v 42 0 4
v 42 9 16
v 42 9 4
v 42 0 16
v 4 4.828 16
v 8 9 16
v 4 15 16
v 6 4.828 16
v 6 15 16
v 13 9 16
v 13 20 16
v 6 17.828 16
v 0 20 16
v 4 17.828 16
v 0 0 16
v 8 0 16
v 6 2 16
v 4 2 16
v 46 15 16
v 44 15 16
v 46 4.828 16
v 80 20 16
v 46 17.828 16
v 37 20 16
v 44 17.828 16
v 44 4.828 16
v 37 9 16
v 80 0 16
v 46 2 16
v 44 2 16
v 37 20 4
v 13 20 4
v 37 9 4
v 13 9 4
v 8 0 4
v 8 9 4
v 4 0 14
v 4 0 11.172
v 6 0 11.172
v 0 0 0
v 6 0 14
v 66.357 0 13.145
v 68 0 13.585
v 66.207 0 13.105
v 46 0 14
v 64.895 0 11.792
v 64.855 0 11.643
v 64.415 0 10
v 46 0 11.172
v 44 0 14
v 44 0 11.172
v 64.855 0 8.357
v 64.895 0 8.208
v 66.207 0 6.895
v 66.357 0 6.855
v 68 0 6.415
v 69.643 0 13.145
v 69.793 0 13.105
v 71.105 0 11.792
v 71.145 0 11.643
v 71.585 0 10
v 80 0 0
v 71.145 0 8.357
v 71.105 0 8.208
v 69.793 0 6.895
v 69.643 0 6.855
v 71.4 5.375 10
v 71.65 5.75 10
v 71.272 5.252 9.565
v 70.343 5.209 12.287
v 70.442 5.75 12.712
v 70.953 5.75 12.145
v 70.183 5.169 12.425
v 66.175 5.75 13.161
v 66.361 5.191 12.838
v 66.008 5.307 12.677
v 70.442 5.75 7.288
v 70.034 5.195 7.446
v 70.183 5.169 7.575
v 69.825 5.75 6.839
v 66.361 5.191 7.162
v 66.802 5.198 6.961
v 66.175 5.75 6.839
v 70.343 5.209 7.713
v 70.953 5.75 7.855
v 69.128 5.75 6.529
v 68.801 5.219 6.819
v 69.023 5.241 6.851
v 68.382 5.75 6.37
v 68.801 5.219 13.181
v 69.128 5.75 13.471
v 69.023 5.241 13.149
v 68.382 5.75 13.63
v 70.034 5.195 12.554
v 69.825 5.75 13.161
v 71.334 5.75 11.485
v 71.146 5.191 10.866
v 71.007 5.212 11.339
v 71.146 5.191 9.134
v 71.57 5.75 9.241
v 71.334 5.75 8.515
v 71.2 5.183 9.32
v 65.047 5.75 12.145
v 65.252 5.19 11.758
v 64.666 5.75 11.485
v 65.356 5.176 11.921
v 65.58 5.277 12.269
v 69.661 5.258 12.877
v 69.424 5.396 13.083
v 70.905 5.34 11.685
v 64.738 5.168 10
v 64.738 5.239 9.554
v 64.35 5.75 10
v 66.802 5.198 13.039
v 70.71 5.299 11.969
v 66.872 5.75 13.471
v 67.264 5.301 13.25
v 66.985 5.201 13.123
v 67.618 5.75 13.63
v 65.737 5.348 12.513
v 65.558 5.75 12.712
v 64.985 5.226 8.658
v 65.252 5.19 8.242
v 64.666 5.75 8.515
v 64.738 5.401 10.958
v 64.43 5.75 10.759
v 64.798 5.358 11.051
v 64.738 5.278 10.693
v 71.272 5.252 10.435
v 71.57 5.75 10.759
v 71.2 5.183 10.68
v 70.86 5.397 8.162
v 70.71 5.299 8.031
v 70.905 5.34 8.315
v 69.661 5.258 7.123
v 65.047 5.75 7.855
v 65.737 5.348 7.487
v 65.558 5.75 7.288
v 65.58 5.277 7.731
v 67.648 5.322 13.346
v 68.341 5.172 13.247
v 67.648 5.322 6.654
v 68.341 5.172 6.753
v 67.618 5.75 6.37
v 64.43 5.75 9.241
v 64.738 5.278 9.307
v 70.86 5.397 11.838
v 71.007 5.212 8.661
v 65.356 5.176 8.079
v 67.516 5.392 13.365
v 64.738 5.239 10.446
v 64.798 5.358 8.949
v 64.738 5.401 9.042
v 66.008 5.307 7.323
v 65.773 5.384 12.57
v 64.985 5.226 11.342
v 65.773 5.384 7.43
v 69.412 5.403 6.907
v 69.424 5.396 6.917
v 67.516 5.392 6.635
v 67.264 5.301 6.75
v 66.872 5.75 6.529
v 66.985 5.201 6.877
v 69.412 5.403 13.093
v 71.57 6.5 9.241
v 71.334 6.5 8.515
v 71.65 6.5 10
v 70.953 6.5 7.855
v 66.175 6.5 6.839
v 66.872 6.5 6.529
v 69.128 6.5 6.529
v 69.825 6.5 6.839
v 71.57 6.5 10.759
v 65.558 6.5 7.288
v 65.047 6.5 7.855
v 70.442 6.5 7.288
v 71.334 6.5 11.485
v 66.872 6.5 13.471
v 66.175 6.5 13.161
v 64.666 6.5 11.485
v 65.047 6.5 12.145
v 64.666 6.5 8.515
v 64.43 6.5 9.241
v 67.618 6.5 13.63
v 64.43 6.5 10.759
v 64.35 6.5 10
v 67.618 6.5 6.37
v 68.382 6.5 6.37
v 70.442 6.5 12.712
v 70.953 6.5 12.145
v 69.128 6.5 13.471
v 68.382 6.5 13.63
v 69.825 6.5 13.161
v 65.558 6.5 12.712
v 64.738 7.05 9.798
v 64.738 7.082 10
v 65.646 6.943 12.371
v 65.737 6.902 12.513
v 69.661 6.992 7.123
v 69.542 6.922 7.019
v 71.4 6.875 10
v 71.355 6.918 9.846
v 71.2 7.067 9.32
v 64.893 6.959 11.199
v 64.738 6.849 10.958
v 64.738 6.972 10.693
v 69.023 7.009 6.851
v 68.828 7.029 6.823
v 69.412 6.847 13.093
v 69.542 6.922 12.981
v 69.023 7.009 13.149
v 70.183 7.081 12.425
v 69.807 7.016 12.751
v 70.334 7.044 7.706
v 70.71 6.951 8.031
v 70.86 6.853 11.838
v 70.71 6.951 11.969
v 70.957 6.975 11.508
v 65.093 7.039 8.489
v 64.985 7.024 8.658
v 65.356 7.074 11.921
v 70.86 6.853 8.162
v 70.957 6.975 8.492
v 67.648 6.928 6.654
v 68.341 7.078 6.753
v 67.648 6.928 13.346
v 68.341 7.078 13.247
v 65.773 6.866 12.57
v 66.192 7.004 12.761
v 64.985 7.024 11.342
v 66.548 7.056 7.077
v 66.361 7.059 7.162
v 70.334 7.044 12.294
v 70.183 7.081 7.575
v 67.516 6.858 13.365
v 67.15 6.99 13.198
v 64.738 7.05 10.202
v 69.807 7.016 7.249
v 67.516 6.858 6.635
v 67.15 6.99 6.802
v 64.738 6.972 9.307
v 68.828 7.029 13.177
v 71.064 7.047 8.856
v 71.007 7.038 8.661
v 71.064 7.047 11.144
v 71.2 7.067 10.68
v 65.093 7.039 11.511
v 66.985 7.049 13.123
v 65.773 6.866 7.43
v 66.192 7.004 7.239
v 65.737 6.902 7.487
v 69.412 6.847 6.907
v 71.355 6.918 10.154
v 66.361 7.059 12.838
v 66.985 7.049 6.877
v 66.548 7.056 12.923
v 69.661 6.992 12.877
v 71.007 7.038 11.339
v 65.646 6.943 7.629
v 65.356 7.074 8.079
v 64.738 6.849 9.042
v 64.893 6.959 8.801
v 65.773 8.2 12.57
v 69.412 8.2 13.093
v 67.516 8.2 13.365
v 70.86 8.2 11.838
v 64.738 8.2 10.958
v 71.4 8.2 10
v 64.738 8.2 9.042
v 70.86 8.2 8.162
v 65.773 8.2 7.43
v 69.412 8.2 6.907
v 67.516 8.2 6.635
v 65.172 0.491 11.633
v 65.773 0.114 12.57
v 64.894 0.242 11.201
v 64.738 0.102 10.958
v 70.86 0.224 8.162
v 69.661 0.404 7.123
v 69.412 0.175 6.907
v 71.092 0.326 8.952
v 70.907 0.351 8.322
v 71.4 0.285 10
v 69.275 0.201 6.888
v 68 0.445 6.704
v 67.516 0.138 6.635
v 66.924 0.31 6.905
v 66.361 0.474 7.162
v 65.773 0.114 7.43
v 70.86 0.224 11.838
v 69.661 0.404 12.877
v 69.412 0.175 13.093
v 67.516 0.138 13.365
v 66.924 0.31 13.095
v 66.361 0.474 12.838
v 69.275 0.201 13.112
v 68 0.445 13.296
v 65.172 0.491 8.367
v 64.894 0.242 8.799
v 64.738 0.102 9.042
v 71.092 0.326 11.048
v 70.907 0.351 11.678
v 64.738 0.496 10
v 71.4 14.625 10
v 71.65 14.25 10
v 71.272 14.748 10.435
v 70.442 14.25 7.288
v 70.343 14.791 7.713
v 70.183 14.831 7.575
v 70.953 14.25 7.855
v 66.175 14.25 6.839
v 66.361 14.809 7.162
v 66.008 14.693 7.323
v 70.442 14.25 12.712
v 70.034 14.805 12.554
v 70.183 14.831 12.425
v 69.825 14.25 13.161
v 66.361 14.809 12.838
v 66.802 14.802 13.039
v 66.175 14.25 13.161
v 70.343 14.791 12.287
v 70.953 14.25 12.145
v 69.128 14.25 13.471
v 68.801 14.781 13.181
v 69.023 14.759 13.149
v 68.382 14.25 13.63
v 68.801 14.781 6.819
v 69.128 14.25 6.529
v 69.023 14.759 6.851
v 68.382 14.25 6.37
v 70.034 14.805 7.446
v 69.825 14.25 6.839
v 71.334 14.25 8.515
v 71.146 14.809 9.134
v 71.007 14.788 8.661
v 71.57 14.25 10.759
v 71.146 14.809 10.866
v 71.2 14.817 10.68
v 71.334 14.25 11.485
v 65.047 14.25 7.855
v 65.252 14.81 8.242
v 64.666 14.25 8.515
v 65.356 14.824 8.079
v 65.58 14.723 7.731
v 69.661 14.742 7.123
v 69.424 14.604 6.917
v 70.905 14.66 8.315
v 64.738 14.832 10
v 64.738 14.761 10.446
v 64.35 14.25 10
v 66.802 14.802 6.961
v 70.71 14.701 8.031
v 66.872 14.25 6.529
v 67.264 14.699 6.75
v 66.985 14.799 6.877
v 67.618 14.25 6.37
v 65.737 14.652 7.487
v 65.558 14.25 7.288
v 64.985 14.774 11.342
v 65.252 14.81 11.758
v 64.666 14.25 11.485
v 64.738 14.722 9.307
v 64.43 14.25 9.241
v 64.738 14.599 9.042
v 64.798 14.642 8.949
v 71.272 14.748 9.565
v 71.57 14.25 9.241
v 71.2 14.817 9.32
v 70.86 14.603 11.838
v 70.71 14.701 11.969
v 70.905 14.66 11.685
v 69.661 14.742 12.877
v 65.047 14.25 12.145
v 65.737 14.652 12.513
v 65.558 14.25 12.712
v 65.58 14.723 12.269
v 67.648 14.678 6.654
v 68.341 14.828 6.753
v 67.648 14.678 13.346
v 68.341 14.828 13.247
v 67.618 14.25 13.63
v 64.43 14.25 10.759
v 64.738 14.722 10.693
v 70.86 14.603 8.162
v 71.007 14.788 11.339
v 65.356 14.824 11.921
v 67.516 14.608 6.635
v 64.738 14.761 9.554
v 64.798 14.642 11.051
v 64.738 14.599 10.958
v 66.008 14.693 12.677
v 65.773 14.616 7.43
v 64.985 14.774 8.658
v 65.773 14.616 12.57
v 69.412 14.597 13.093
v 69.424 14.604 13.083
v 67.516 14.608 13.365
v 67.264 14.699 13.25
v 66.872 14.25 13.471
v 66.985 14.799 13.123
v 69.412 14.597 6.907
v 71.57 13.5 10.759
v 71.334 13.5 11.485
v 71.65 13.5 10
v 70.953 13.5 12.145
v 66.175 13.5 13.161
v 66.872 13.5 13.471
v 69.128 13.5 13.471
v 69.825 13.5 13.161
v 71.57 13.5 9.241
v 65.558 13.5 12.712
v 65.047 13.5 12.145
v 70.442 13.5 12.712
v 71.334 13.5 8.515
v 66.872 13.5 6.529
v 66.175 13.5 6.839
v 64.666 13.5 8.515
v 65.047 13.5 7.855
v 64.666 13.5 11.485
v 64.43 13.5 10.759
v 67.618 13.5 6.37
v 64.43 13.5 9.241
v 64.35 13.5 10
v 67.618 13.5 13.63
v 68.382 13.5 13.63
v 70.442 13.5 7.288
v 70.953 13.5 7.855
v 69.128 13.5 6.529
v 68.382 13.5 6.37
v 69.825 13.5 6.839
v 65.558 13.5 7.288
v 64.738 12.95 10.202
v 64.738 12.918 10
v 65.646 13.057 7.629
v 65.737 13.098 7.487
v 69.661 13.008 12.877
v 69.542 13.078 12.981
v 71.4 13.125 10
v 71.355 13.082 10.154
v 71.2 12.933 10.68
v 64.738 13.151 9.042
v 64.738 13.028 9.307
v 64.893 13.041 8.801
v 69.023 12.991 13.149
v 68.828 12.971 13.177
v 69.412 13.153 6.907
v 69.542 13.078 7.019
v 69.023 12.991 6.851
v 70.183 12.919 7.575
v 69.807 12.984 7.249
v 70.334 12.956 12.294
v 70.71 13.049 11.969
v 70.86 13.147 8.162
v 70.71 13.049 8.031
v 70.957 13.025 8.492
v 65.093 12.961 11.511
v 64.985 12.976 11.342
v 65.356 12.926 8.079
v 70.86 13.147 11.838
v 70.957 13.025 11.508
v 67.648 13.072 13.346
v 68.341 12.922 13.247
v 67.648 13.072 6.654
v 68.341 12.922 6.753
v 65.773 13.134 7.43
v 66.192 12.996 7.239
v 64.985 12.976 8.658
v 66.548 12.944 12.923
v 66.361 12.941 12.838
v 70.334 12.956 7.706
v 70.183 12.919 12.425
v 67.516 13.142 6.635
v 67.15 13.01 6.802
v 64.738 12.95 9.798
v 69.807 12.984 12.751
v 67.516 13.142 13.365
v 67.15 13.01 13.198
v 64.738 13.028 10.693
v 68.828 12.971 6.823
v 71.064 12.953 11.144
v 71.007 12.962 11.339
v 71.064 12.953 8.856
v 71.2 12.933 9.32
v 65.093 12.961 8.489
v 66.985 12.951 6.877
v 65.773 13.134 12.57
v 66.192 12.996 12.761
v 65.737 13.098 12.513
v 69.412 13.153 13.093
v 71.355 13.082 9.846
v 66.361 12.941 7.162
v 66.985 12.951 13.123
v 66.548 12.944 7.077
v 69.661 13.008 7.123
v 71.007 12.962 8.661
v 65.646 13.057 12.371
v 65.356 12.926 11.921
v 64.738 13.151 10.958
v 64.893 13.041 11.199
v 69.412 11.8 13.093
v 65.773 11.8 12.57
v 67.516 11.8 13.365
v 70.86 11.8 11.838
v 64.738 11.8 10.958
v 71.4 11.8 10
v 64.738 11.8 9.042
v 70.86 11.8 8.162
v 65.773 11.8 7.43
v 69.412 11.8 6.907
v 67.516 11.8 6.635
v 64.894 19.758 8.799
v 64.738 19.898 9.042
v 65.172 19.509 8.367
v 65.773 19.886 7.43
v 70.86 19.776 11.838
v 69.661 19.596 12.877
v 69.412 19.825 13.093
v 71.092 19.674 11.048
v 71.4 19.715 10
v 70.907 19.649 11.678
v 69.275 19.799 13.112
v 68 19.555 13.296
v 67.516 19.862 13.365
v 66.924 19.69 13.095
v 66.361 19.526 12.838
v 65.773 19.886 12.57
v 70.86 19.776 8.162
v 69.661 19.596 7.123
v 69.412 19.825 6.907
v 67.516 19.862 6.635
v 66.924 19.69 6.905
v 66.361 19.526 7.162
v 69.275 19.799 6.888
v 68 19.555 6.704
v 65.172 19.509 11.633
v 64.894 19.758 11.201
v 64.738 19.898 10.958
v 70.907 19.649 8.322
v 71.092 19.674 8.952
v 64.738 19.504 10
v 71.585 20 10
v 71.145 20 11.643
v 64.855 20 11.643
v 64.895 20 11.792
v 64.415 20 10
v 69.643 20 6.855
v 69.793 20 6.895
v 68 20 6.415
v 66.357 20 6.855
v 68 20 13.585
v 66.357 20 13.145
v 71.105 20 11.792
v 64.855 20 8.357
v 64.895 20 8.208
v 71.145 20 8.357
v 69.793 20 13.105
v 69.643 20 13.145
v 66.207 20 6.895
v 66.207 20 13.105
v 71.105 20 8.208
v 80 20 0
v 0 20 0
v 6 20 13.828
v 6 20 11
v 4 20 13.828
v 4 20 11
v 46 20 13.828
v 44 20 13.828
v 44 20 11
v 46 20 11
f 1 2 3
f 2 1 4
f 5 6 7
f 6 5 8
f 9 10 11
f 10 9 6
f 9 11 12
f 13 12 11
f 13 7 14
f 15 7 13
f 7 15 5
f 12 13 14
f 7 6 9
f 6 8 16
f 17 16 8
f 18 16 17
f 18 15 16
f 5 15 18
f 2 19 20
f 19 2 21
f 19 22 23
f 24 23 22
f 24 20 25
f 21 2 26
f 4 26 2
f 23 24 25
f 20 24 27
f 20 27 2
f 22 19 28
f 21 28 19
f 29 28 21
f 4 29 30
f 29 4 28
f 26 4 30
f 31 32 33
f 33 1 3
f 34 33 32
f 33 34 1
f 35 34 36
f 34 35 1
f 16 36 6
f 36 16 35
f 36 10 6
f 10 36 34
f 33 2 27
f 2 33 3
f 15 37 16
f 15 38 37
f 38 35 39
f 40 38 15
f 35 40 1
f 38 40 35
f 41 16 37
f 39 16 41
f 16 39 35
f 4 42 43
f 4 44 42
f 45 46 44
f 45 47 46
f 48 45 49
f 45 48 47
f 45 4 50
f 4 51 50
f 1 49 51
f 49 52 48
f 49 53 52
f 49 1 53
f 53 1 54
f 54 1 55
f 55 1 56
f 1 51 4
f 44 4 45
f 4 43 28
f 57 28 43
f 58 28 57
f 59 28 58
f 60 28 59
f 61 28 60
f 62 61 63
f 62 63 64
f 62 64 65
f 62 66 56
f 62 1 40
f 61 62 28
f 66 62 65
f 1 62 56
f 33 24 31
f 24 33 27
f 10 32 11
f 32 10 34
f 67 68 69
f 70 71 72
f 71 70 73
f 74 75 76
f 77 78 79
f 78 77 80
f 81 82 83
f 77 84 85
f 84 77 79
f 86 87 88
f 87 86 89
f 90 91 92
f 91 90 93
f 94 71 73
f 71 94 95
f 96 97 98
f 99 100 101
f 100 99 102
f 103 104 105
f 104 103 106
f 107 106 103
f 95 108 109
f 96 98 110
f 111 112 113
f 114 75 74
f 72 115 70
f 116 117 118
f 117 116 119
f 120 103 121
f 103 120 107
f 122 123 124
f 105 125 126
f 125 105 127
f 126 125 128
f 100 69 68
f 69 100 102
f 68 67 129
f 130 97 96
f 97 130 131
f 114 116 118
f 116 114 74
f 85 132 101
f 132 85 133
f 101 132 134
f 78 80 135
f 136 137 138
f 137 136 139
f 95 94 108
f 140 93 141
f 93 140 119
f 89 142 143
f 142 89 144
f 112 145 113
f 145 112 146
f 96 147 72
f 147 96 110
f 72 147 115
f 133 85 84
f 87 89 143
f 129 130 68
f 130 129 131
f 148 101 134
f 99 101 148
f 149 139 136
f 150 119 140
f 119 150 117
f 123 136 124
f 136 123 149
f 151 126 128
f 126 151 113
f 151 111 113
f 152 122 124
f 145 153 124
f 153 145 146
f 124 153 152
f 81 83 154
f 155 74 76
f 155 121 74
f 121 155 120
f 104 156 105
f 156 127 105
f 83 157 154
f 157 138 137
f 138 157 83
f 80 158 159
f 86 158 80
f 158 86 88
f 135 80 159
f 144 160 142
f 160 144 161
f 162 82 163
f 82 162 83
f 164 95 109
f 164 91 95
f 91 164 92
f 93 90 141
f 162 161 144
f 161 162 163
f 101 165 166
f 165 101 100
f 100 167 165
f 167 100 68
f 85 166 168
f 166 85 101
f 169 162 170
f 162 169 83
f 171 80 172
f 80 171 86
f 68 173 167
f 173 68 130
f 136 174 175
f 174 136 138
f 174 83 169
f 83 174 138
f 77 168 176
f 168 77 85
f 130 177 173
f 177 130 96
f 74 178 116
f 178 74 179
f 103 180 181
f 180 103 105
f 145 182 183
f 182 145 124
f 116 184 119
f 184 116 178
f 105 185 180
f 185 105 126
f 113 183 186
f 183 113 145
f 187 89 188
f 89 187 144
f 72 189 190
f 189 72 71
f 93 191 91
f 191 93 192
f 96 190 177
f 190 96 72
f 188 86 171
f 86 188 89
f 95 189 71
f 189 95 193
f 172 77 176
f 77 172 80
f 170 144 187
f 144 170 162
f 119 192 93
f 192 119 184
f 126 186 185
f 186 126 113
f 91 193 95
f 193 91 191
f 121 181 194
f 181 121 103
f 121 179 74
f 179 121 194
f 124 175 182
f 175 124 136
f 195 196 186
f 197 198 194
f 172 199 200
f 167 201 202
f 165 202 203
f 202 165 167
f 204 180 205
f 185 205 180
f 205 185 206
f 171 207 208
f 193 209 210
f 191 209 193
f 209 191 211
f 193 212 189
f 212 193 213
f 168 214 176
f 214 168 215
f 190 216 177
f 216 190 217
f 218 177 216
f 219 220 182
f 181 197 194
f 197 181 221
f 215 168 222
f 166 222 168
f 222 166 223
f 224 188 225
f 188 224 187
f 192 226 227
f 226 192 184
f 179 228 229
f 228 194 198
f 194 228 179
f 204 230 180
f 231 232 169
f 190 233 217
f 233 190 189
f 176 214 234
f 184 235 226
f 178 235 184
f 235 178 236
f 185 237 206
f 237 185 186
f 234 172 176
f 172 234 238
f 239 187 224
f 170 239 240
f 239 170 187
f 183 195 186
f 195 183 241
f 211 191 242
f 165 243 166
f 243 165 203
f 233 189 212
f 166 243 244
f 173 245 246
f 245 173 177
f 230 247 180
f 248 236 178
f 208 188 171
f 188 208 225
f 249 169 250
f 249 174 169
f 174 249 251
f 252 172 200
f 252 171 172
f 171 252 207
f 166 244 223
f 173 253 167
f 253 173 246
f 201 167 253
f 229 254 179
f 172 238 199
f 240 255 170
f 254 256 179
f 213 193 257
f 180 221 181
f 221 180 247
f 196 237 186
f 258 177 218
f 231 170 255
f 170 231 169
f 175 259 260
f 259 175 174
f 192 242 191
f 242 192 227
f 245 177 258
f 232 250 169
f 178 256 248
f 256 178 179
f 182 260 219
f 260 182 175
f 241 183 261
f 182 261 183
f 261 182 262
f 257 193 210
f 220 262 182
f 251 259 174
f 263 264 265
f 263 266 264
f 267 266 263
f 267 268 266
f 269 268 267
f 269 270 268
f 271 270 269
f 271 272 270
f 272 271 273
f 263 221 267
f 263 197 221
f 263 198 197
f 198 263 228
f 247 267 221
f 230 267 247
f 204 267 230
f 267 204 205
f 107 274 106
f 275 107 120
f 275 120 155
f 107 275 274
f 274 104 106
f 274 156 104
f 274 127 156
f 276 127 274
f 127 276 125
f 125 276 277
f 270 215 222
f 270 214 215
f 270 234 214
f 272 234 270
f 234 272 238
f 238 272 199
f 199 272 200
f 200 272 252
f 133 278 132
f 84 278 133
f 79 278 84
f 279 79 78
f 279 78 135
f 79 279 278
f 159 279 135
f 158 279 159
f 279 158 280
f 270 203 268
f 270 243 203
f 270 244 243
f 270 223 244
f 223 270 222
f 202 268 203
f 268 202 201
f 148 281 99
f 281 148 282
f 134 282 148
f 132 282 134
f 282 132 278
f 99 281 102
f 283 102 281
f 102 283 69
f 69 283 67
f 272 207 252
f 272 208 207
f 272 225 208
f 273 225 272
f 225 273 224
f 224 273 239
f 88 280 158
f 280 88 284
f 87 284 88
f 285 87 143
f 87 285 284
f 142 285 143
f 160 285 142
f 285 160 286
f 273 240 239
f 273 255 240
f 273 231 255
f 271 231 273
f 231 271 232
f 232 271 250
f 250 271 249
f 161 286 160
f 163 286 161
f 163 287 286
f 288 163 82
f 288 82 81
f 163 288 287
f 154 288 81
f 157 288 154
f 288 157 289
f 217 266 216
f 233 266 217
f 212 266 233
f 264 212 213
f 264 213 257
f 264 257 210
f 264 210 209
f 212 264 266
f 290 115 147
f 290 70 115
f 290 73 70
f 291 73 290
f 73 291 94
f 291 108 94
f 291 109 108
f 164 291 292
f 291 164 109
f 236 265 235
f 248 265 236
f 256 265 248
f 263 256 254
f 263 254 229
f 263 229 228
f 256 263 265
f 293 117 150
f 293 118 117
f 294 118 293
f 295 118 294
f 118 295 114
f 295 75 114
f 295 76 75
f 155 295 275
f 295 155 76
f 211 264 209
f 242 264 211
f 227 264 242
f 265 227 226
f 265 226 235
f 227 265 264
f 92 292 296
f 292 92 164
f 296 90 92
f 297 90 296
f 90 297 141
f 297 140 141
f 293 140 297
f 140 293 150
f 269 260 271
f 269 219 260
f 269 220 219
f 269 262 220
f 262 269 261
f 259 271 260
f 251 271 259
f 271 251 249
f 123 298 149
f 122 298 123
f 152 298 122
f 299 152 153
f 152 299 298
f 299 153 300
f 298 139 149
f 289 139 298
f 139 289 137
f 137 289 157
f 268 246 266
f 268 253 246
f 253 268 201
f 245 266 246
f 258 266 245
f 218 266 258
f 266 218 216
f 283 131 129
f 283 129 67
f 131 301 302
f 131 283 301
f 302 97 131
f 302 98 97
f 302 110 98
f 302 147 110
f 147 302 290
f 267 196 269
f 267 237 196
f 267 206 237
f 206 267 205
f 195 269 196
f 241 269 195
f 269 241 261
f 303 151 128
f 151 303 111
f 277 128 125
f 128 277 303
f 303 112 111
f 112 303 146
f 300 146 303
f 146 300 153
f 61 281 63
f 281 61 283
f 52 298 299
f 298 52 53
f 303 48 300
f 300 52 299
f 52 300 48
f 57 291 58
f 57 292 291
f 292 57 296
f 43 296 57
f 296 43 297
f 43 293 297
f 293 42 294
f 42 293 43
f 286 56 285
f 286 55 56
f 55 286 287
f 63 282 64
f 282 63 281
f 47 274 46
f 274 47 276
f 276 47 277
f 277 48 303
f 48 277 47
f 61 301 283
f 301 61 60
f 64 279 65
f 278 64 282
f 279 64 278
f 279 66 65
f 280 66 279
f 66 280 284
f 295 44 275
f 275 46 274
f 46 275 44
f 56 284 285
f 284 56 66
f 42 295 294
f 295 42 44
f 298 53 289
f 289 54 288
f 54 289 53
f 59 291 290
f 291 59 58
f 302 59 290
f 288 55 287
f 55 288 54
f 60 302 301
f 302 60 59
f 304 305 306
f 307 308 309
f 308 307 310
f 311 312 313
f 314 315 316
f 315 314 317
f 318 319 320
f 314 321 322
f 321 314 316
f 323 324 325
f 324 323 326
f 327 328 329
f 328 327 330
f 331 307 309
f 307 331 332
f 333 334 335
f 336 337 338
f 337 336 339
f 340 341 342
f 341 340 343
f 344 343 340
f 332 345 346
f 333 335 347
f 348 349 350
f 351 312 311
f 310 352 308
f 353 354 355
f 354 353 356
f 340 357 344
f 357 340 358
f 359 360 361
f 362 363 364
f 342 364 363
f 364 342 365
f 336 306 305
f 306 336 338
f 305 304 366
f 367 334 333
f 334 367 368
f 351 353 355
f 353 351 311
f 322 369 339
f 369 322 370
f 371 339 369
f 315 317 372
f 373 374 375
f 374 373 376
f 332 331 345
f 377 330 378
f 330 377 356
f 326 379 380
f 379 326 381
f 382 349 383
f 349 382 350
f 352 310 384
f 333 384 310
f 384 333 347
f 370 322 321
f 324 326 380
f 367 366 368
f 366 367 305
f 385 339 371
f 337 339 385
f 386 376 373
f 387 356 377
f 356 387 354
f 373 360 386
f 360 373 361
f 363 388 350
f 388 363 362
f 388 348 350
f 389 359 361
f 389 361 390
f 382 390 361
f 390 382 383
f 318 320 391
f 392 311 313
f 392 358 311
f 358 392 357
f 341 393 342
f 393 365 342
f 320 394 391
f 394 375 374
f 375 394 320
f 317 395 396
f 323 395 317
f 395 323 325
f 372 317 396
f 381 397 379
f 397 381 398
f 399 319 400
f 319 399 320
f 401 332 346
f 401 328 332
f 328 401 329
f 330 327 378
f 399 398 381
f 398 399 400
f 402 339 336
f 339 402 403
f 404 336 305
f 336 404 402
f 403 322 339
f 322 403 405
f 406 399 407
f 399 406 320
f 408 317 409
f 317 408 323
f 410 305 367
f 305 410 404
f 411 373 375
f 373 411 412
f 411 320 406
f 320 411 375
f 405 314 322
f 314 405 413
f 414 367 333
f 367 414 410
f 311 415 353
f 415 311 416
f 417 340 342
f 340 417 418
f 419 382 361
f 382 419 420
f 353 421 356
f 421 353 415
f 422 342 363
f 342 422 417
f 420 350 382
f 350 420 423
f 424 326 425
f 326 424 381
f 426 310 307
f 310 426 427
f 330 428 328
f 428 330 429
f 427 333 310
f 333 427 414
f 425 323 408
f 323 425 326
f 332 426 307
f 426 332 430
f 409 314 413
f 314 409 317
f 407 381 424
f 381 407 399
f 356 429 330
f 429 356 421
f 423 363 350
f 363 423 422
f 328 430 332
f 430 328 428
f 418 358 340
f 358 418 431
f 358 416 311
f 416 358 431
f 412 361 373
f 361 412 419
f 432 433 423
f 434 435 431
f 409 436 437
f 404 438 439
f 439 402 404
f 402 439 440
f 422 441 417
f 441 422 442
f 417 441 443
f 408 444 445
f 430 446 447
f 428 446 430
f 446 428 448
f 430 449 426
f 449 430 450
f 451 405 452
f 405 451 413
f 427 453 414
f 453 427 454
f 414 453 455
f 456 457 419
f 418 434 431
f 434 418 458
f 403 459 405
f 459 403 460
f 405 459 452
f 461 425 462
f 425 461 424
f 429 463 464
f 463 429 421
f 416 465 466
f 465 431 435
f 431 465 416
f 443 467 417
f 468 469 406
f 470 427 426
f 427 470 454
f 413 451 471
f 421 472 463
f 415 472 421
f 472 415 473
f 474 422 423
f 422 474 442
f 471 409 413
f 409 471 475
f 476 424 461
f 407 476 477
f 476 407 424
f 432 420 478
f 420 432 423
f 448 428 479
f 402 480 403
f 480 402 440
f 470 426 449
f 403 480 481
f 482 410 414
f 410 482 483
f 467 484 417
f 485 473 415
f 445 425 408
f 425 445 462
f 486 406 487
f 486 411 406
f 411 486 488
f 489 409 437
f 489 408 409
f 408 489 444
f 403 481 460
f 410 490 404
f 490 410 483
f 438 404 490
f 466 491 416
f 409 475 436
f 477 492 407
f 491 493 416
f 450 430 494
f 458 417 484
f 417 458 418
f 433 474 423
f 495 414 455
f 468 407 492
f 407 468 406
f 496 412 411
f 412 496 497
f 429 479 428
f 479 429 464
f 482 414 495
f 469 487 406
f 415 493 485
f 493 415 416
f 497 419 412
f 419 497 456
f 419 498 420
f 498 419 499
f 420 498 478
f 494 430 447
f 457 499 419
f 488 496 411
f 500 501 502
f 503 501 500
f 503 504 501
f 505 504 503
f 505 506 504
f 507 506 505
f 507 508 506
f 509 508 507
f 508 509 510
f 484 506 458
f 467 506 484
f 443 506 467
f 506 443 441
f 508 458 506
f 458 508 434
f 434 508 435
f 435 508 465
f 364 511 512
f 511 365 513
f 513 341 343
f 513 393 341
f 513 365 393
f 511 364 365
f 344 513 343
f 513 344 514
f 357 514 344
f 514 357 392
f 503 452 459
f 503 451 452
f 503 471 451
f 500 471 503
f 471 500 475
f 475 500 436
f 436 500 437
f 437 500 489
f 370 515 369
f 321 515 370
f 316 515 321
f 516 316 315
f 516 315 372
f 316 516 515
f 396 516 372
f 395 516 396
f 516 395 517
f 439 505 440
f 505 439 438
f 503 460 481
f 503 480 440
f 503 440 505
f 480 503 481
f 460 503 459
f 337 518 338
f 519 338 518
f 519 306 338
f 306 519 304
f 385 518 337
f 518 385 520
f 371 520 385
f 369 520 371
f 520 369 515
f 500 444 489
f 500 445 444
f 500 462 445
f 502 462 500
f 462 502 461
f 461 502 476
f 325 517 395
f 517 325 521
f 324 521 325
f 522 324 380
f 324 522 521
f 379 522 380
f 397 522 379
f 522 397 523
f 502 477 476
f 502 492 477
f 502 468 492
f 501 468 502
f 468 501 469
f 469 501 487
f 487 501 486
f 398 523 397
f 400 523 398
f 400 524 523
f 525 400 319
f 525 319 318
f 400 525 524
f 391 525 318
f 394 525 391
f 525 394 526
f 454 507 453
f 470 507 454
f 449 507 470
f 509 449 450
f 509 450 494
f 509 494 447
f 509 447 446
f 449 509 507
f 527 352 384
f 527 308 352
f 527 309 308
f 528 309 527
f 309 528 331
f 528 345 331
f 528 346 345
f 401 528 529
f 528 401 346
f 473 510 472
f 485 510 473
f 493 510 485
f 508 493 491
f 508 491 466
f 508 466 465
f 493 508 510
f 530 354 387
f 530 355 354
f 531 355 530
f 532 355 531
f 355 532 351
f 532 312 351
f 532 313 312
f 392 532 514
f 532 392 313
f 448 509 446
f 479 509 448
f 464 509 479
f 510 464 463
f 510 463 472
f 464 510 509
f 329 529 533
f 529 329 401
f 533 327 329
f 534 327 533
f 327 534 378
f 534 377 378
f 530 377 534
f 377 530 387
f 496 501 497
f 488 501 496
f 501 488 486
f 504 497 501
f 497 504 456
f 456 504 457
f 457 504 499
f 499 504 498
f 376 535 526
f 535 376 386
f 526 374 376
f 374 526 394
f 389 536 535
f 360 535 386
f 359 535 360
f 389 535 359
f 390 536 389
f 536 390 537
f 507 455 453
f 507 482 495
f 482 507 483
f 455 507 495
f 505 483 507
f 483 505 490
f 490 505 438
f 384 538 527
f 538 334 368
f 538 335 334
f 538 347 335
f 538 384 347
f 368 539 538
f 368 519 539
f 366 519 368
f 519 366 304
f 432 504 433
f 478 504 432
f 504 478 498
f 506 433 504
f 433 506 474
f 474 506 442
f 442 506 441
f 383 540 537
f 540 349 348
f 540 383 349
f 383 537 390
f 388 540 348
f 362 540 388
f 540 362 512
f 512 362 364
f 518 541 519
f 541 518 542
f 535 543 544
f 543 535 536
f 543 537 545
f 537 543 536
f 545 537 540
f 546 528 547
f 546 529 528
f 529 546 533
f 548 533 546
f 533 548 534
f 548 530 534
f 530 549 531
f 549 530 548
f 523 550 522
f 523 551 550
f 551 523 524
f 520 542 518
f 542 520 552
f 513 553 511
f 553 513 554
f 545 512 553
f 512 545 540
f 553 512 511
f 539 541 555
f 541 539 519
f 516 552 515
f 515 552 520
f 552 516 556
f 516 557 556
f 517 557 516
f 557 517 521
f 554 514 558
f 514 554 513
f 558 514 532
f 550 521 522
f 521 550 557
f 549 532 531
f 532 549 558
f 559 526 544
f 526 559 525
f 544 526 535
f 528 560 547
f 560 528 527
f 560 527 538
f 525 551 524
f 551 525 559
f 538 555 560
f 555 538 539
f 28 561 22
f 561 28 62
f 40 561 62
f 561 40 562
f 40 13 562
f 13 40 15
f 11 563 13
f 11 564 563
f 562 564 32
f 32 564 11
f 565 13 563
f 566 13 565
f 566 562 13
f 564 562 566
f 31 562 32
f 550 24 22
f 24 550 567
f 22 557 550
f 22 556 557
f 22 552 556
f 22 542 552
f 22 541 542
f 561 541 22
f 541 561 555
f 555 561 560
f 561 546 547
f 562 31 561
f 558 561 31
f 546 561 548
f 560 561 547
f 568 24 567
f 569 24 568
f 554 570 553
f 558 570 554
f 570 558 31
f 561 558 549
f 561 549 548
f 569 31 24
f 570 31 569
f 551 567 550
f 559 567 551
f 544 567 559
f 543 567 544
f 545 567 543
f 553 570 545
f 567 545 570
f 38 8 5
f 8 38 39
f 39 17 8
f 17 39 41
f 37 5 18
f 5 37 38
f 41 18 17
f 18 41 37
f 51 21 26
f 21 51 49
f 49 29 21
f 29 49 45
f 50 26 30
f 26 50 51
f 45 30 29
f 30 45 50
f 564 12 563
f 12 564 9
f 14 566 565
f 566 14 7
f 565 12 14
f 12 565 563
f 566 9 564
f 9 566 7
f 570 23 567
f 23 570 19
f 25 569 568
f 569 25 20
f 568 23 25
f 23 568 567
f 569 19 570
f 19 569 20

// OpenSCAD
// Pin Connectors V2
// Tony Buser <tbuser@gmail.com>
// From http://www.thingiverse.com/thing:10541

// pinhole(h=5);

tolerance=0.3;

difference() {

// The base
cube([80, 20, 16]);

// Servo body
translate([8, 0, 4]) {
  // Servo front
  cube([34, 9, 12]);
  // Servo body
  translate([5, 0, 0]) cube([24, 24, 12]);
}

translate([68, 0, 10]) rotate([-90, 0, 0])
pinhole(r=3, h=8, t=tolerance, tight=false);

translate([68, 20, 10]) rotate([90, 0, 0])
pinhole(r=3, h=8, t=tolerance, tight=false);

// String holes
translate([4, 0, 16]) translate([0, -2, -4]) rotate([-45, 0, 0]) cube([2, 2, 20]);
translate([44, 0, 16]) translate([0, -2, -4]) rotate([-45, 0, 0]) cube([2, 2, 20]);
translate([4, 23, 8]) rotate([45, 0, 0]) cube([2, 2, 20]);
translate([44, 23, 8]) rotate([45, 0, 0]) cube([2, 2, 20]);


}

// test();
// pintack(h=10);
// pinpeg(h=20);

module test() {
  tolerance = 0.3;
  
  translate([-12, 12, 0]) pinpeg(h=20);
  translate([12, 12, 0]) pintack(h=10);
  
  difference() {
    union() {
      translate([0, -12, 2.5]) cube(size = [59, 20, 5], center = true);
      translate([24, -12, 7.5]) cube(size = [12, 20, 15], center = true);
    }
    translate([-24, -12, 0]) pinhole(h=5, t=tolerance);
    translate([-12, -12, 0]) pinhole(h=5, t=tolerance, tight=false);
    translate([0, -12, 0]) pinhole(h=10, t=tolerance);
    translate([12, -12, 0]) pinhole(h=10, t=tolerance, tight=false);
    translate([24, -12, 15]) rotate([0, 180, 0]) pinhole(h=10, t=tolerance);
  }
}

module pinhole(h=10, r=4, lh=3, lt=1, t=0.3, tight=true) {
  // h = shaft height
  // r = shaft radius
  // lh = lip height
  // lt = lip thickness
  // t = tolerance
  // tight = set to false if you want a joint that spins easily
  
  union() {
    pin_solid(h, r+(t/2), lh, lt);
    cylinder(h=h+0.2, r=r);
    // widen the cylinder slightly
    // cylinder(h=h+0.2, r=r+(t-0.2/2));
    if (tight == false) {
      cylinder(h=h+0.2, r=r+(t/2)+0.25);
    }
    // widen the entrance hole to make insertion easier
    translate([0, 0, -0.1]) cylinder(h=lh/3, r2=r, r1=r+(t/2)+(lt/2));
  }
}

module pin(h=10, r=4, lh=3, lt=1, side=false) {
  // h = shaft height
  // r = shaft radius
  // lh = lip height
  // lt = lip thickness
  // side = set to true if you want it printed horizontally

  if (side) {
    pin_horizontal(h, r, lh, lt);
  } else {
    pin_vertical(h, r, lh, lt);
  }
}

module pintack(h=10, r=4, lh=3, lt=1, bh=3, br=8.75) {
  // bh = base_height
  // br = base_radius
  
  union() {
    cylinder(h=bh, r=br);
    translate([0, 0, bh]) pin(h, r, lh, lt);
  }
}

module pinpeg(h=20, r=4, lh=3, lt=1) {
  union() {
    translate([0, -h/4+0.05, 0]) pin(h/2+0.1, r, lh, lt, side=true);
    translate([0, h/4-0.05, 0]) rotate([0, 0, 180]) pin(h/2+0.1, r, lh, lt, side=true);
  }
}

// just call pin instead, I made this module because it was easier to do the rotation option this way
// since openscad complains of recursion if I did it all in one module
module pin_vertical(h=10, r=4, lh=3, lt=1) {
  // h = shaft height
  // r = shaft radius
  // lh = lip height
  // lt = lip thickness

  difference() {
    pin_solid(h, r, lh, lt);
    
    // center cut
    translate([-r*0.5/2, -(r*2+lt*2)/2, h/4]) cube([r*0.5, r*2+lt*2, h]);
    translate([0, 0, h/4]) cylinder(h=h+lh, r=r/2.5, $fn=20);
    // center curve
    // translate([0, 0, h/4]) rotate([90, 0, 0]) cylinder(h=r*2, r=r*0.5/2, center=true, $fn=20);
  
    // side cuts
    translate([-r*2, -lt-r*1.125, -1]) cube([r*4, lt*2, h+2]);
    translate([-r*2, -lt+r*1.125, -1]) cube([r*4, lt*2, h+2]);
  }
}

// call pin with side=true instead of this
module pin_horizontal(h=10, r=4, lh=3, lt=1) {
  // h = shaft height
  // r = shaft radius
  // lh = lip height
  // lt = lip thickness
  translate([0, h/2, r*1.125-lt]) rotate([90, 0, 0]) pin_vertical(h, r, lh, lt);
}

// this is mainly to make the pinhole module easier
module pin_solid(h=10, r=4, lh=3, lt=1) {
  union() {
    // shaft
    cylinder(h=h-lh, r=r, $fn=30);
    // lip
    // translate([0, 0, h-lh]) cylinder(h=lh*0.25, r1=r, r2=r+(lt/2), $fn=30);
    // translate([0, 0, h-lh+lh*0.25]) cylinder(h=lh*0.25, r2=r, r1=r+(lt/2), $fn=30);
    // translate([0, 0, h-lh+lh*0.50]) cylinder(h=lh*0.50, r1=r, r2=r-(lt/2), $fn=30);

    // translate([0, 0, h-lh]) cylinder(h=lh*0.50, r1=r, r2=r+(lt/2), $fn=30);
    // translate([0, 0, h-lh+lh*0.50]) cylinder(h=lh*0.50, r1=r+(lt/2), r2=r-(lt/3), $fn=30);    

    translate([0, 0, h-lh]) cylinder(h=lh*0.25, r1=r, r2=r+(lt/2), $fn=30);
    translate([0, 0, h-lh+lh*0.25]) cylinder(h=lh*0.25, r=r+(lt/2), $fn=30);    
    translate([0, 0, h-lh+lh*0.50]) cylinder(h=lh*0.50, r1=r+(lt/2), r2=r-(lt/2), $fn=30);    

    // translate([0, 0, h-lh]) cylinder(h=lh, r1=r+(lt/2), r2=1, $fn=30);
    // translate([0, 0, h-lh-lt/2]) cylinder(h=lt/2, r1=r, r2=r+(lt/2), $fn=30);
  }
}
